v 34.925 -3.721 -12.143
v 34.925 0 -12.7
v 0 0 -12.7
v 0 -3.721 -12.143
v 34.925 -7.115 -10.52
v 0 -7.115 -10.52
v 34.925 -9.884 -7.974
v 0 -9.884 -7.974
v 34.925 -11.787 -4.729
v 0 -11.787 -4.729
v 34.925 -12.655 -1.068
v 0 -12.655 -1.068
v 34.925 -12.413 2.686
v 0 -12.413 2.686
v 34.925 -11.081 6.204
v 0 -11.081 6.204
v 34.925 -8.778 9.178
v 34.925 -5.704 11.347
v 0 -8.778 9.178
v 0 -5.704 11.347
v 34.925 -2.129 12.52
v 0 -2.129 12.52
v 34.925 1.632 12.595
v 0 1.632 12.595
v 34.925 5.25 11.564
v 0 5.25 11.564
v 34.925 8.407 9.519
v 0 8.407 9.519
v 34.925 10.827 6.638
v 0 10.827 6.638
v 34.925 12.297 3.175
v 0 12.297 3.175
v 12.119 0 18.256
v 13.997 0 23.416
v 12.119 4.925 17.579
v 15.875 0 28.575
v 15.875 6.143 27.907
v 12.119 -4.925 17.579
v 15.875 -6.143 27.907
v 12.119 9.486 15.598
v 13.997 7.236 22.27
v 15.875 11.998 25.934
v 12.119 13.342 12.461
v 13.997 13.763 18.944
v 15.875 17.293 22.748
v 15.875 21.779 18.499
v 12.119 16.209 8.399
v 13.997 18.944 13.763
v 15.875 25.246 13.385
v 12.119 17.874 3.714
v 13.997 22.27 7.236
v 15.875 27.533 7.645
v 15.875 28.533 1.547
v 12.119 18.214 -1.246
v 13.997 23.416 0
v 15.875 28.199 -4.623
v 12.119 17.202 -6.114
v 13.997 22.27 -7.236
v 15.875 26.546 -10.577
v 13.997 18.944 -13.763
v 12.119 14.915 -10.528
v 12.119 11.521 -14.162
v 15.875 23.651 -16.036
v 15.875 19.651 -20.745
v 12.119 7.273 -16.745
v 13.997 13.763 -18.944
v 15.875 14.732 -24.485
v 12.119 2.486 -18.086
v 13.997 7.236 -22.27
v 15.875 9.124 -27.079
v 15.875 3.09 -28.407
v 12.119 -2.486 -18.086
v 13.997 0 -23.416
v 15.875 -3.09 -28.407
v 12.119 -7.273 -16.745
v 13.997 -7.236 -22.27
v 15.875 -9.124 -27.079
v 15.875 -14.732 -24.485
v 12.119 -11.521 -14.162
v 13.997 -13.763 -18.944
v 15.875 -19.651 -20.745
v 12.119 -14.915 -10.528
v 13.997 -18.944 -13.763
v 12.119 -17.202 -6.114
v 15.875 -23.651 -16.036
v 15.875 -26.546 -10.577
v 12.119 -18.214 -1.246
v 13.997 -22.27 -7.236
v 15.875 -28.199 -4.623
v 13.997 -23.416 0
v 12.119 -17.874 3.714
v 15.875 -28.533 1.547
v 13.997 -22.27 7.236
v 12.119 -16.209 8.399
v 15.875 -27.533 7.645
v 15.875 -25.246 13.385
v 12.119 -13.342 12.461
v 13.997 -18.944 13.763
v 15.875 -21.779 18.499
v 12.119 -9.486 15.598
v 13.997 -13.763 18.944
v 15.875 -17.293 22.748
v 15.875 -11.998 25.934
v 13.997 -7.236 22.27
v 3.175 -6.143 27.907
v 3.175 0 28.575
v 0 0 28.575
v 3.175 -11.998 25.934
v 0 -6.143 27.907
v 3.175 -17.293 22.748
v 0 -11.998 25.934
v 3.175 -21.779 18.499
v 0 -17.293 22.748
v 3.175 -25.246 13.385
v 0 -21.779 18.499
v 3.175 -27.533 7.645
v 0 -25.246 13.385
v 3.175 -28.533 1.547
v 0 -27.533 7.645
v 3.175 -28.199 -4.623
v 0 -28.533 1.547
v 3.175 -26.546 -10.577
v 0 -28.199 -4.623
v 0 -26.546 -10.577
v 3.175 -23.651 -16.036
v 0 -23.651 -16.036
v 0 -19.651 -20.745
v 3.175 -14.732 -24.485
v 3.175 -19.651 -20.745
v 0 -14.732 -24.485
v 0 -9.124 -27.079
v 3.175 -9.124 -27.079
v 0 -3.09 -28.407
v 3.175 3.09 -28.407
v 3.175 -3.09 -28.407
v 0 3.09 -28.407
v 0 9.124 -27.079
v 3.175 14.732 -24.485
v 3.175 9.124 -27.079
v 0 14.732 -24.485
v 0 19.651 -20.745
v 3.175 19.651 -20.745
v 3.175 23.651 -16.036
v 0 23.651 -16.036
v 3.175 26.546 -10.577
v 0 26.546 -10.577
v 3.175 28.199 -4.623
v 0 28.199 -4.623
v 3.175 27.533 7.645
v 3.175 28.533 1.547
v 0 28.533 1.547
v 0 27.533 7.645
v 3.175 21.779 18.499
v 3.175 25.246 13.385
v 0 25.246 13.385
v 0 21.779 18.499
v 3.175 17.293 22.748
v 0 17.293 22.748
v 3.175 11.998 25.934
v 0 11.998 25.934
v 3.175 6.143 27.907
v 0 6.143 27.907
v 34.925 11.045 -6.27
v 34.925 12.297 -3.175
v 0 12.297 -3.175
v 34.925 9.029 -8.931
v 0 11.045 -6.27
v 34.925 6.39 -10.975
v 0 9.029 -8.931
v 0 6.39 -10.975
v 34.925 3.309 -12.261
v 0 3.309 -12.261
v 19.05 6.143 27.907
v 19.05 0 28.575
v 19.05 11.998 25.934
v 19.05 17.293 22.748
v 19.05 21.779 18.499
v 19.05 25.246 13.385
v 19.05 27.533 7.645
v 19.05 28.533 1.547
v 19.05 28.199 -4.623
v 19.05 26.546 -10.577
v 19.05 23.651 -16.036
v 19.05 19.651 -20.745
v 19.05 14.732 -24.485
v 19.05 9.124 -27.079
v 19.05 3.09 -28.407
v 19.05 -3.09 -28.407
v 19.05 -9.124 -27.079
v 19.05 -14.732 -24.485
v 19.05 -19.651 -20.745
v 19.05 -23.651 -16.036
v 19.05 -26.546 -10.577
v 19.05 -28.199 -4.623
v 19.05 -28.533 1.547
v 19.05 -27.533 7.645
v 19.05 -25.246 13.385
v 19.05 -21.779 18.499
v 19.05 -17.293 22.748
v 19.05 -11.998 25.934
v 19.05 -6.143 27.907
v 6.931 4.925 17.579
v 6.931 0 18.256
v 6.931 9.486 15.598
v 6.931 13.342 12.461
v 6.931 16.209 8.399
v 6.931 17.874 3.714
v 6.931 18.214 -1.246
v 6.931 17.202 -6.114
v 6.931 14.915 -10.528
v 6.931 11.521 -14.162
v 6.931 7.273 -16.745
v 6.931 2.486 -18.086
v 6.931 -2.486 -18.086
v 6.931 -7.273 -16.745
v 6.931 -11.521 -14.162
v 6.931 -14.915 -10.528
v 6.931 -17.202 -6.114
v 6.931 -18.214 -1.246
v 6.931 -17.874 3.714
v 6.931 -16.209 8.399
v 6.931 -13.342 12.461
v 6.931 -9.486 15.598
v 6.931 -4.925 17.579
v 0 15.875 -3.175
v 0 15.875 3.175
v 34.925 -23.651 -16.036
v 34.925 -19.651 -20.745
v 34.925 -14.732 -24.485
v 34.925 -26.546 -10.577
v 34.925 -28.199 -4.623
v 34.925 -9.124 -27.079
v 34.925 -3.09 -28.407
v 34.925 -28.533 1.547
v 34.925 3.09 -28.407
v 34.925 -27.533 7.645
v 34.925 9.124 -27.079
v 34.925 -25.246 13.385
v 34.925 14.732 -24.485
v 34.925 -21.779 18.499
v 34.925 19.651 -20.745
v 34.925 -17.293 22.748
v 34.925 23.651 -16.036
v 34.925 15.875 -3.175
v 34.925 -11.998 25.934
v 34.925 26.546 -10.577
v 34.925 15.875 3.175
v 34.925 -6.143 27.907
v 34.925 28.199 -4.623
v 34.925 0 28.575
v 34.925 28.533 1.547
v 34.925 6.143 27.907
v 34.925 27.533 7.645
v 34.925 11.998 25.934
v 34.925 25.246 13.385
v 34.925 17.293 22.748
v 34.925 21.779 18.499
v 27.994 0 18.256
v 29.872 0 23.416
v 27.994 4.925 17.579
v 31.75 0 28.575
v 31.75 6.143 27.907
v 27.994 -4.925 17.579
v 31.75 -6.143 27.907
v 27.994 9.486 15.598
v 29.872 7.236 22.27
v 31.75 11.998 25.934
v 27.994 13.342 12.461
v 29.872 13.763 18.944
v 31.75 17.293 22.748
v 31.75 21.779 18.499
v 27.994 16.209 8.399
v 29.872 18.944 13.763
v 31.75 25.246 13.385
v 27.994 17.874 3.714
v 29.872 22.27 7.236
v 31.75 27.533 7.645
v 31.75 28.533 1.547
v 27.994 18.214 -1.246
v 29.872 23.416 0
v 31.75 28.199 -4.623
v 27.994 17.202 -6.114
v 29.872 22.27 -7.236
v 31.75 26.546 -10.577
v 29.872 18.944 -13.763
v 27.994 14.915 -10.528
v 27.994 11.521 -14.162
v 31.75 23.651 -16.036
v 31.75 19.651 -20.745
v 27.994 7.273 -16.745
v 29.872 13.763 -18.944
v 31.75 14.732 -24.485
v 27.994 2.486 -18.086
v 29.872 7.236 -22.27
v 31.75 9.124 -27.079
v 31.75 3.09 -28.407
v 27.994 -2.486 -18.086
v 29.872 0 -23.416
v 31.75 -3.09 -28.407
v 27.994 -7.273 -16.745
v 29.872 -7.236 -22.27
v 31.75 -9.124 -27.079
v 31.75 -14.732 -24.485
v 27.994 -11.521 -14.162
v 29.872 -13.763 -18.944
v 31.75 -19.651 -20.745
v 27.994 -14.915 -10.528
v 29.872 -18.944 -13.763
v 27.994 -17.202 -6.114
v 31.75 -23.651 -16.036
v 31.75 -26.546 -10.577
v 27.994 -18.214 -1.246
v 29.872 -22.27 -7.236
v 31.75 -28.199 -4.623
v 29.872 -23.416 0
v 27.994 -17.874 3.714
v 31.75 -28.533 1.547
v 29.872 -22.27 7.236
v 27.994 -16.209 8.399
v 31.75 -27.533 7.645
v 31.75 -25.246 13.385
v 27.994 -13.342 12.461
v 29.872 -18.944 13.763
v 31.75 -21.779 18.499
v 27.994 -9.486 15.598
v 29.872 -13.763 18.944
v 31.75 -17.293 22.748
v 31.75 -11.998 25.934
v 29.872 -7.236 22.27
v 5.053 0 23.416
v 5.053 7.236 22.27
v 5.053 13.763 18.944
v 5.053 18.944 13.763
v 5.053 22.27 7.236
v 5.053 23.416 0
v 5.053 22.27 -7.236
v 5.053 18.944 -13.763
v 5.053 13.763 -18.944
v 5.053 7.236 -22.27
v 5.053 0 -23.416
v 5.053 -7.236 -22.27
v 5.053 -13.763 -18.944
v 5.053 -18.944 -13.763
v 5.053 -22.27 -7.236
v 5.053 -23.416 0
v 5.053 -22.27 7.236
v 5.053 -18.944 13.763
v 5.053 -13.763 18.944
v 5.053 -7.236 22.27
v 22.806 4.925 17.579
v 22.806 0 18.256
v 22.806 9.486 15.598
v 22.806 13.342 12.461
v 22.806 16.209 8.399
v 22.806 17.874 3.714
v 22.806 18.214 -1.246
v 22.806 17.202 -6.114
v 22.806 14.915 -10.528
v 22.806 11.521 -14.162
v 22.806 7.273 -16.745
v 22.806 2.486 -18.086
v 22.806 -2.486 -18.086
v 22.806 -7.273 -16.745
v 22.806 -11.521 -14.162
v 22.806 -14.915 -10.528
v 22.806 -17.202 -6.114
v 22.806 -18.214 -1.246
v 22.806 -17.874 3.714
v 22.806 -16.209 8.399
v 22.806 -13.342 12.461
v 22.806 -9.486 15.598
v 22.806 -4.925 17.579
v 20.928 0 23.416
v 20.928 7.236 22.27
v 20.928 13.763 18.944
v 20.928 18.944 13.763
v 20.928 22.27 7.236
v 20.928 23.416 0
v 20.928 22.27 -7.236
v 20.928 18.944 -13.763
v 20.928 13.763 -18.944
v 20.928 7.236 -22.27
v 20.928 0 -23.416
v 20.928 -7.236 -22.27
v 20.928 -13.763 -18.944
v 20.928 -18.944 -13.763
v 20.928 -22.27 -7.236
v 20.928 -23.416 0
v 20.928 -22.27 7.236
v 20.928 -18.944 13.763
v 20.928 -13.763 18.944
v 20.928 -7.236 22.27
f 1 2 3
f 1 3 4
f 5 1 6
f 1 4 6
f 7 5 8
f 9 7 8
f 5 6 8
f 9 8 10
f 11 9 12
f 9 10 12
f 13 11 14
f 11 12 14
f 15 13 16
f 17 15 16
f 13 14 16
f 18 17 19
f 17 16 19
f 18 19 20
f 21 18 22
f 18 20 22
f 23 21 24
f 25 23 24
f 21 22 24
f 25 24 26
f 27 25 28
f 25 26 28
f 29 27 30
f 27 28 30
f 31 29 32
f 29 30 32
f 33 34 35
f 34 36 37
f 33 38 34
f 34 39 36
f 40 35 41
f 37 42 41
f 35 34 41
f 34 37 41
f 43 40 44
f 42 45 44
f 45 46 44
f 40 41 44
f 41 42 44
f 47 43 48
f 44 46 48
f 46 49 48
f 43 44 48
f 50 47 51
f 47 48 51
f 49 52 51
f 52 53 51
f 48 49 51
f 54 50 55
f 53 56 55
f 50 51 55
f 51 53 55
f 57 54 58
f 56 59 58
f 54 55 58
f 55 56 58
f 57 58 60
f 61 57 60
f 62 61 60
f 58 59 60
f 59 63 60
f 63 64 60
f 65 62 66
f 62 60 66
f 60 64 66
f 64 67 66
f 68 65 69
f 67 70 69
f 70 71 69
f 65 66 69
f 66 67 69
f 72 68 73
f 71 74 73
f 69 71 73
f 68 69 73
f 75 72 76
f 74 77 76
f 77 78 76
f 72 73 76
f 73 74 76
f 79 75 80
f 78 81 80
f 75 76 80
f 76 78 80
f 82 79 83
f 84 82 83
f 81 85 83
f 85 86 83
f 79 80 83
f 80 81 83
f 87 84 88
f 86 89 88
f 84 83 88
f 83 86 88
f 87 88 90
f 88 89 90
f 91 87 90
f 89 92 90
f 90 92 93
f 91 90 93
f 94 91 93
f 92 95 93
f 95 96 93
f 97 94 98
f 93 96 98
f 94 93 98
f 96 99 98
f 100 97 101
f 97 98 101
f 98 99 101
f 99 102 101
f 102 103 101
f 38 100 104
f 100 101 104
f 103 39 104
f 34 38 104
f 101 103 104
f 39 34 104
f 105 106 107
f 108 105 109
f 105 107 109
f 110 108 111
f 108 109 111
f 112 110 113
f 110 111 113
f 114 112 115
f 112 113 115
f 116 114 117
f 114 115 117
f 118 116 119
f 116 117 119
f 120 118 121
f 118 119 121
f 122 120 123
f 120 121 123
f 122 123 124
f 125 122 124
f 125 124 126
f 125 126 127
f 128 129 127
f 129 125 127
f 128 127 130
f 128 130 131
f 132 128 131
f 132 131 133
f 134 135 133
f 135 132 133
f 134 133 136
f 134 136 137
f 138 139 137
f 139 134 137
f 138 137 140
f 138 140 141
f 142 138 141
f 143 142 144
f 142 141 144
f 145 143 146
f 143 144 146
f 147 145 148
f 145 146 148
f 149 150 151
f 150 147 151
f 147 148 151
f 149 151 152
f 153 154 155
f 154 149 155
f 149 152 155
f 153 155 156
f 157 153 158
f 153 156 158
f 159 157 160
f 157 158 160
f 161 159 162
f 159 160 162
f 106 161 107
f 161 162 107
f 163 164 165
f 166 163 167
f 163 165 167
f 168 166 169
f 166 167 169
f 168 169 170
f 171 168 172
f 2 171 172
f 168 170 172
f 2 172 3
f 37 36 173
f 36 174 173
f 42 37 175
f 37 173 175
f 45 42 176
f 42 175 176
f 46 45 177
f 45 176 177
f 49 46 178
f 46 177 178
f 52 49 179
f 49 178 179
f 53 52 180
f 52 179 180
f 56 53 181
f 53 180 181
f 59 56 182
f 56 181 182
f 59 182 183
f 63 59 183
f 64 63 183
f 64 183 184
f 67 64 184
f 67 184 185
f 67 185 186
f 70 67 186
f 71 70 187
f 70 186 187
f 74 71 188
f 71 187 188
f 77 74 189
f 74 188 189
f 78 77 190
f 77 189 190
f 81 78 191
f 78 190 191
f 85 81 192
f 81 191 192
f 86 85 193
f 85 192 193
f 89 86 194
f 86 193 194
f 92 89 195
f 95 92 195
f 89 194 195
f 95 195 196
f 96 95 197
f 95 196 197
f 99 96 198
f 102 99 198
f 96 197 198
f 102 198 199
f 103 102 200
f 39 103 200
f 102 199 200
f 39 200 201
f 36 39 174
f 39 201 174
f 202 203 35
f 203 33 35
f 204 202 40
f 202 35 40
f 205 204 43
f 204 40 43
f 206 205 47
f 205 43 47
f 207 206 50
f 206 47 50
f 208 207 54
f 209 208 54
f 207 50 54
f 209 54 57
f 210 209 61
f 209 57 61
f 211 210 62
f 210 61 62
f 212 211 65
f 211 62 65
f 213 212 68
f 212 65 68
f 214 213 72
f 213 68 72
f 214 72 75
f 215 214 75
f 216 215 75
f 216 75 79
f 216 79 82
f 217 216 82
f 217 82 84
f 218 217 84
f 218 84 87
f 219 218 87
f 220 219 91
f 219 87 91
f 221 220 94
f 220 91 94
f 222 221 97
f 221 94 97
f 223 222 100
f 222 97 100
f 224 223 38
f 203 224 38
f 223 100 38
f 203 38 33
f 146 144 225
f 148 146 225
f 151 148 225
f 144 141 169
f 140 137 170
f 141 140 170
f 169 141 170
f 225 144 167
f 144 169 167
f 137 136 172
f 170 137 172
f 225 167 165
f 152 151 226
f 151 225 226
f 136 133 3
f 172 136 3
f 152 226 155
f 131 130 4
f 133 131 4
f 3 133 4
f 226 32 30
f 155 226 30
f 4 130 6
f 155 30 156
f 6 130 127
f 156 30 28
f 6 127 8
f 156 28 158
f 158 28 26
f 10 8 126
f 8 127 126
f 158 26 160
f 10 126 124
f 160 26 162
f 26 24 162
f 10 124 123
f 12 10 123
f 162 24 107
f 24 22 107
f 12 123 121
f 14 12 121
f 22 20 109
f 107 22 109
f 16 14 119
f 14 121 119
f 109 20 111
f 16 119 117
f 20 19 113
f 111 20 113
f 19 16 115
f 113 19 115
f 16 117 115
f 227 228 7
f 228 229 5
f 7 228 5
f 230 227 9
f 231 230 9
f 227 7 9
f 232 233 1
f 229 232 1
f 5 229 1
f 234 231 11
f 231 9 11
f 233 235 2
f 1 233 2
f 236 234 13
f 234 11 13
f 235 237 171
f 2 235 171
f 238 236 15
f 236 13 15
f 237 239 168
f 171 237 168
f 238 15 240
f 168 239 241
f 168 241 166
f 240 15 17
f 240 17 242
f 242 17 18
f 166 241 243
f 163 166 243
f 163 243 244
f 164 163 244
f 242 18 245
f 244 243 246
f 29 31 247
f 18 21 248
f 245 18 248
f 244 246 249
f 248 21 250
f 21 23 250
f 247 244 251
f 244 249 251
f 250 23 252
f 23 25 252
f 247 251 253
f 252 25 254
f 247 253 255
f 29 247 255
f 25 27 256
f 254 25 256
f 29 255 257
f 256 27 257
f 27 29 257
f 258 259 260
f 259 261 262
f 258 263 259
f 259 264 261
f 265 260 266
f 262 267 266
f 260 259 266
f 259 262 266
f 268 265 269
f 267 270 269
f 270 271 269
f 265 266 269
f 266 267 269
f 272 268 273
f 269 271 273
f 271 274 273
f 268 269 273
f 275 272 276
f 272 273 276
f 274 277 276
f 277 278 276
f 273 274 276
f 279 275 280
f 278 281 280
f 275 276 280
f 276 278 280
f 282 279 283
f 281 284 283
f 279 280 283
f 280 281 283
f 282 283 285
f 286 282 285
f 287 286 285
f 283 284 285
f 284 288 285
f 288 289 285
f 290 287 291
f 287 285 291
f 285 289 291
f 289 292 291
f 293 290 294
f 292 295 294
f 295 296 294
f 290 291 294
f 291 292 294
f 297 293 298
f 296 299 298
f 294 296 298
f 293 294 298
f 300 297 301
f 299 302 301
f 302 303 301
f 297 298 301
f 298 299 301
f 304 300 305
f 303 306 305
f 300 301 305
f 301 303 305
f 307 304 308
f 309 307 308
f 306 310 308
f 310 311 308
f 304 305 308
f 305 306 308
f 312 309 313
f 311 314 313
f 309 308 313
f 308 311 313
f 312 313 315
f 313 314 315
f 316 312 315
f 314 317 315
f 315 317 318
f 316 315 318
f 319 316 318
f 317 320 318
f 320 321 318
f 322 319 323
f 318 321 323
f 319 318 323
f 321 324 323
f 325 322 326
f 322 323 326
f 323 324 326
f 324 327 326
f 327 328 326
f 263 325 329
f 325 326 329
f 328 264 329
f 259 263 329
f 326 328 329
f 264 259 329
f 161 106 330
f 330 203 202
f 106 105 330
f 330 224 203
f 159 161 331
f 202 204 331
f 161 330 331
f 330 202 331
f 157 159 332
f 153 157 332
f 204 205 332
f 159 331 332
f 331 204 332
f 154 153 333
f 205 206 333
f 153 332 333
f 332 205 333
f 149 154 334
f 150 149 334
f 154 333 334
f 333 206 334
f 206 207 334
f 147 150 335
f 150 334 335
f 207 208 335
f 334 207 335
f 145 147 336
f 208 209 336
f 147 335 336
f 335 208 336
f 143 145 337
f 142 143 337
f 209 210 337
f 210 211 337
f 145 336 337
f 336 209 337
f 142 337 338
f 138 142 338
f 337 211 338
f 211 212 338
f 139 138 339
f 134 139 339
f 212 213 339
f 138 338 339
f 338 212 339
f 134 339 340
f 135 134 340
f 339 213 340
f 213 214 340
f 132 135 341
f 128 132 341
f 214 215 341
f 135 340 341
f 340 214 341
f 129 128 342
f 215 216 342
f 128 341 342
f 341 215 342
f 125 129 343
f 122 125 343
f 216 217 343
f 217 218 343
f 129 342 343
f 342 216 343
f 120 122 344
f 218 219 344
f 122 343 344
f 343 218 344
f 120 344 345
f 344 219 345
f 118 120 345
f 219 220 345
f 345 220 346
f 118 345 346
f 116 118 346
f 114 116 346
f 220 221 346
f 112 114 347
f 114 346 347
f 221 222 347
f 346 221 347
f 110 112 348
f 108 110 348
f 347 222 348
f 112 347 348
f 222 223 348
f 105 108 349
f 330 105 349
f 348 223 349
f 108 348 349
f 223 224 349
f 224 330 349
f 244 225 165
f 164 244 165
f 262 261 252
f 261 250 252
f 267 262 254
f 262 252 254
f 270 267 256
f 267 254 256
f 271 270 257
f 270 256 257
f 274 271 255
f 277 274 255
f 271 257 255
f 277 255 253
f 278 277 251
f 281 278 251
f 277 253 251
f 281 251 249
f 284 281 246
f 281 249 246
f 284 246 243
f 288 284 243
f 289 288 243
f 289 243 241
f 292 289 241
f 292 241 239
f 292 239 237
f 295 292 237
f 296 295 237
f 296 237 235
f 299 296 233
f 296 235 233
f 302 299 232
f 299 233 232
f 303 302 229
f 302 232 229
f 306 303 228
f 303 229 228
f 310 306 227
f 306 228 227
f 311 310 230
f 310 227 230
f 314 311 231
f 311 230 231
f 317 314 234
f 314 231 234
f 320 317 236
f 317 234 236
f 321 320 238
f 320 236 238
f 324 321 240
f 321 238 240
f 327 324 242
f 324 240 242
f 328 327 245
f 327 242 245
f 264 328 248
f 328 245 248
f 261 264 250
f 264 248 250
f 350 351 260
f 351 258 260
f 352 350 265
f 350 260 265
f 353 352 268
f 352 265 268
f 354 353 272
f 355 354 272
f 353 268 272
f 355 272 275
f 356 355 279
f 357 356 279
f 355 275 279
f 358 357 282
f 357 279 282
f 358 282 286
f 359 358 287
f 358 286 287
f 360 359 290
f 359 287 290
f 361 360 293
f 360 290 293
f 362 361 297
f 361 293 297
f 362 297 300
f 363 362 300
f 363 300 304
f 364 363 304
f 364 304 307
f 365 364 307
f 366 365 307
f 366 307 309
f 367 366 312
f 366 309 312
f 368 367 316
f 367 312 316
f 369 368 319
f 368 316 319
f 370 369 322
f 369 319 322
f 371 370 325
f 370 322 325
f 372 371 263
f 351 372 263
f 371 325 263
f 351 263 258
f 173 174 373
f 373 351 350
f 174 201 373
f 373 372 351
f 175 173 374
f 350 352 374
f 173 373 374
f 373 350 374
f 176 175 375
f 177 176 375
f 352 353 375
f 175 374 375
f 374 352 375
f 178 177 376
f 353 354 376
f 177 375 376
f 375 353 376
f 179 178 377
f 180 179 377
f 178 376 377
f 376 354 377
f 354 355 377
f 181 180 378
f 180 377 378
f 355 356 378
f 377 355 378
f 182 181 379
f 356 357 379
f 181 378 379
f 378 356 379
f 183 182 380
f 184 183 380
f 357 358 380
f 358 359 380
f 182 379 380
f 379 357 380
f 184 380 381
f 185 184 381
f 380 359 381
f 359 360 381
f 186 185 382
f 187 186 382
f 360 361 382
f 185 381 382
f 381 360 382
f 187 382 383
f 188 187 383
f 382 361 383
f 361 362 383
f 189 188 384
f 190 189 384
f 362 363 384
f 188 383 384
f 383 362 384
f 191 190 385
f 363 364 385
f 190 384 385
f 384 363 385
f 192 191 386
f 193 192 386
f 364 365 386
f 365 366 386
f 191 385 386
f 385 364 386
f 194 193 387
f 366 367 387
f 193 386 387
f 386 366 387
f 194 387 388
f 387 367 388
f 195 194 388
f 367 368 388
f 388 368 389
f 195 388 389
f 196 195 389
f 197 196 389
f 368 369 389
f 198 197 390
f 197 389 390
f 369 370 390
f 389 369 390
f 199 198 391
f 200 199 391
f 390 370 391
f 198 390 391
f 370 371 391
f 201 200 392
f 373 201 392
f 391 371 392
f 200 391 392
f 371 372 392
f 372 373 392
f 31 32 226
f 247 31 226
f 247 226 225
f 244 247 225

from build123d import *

# Parameters (mm, degrees)
SKETCH1_R           = 28.575
BOSS_EXTRUDE1_DEPTH = 38.1


with BuildPart() as part:
    # Sketch1 → Boss-Extrude1 (new body)
    with BuildSketch(Plane(origin=(0, 0, 0), x_dir=(0, 0, -1), z_dir=(1, 0, 0))):
        Circle(SKETCH1_R)
        with BuildLine():
            ThreePointArc((12.7, 0), (-7.777129933, -10.040231571), (-3.175, 12.296722124))
            Line((-3.175, 12.296722124), (-3.175, 15.875))
            Line((-3.175, 15.875), (3.175, 15.875))
            Line((3.175, 15.875), (3.175, 12.296722124))
            ThreePointArc((3.175, 12.296722124), (10.040231571, 7.777129933), (12.7, 0))
        make_face(mode=Mode.SUBTRACT)
    extrude(amount=BOSS_EXTRUDE1_DEPTH)

    # Sketch2 → Cut-Revolve1 (revolve, cut)
    with BuildSketch(Plane.XY):
        Polygon((0, 28.575), (3.175, 28.575), (6.930717855, 18.25625), (12.119282145, 18.25625), (15.875, 28.575), (19.05, 28.575), (22.805717855, 18.25625), (27.994282145, 18.25625), (31.75, 28.575), (34.925, 28.575), (34.925, 3.709633234), (38.1, 3.709633234), (38.1, 28.575), (38.1, 34.001656794), (0, 34.001656794), align=None)
    revolve(axis=Axis((-1.262943143, 0, 0), (-1, 0, 0)), mode=Mode.SUBTRACT)


solid = part.part
